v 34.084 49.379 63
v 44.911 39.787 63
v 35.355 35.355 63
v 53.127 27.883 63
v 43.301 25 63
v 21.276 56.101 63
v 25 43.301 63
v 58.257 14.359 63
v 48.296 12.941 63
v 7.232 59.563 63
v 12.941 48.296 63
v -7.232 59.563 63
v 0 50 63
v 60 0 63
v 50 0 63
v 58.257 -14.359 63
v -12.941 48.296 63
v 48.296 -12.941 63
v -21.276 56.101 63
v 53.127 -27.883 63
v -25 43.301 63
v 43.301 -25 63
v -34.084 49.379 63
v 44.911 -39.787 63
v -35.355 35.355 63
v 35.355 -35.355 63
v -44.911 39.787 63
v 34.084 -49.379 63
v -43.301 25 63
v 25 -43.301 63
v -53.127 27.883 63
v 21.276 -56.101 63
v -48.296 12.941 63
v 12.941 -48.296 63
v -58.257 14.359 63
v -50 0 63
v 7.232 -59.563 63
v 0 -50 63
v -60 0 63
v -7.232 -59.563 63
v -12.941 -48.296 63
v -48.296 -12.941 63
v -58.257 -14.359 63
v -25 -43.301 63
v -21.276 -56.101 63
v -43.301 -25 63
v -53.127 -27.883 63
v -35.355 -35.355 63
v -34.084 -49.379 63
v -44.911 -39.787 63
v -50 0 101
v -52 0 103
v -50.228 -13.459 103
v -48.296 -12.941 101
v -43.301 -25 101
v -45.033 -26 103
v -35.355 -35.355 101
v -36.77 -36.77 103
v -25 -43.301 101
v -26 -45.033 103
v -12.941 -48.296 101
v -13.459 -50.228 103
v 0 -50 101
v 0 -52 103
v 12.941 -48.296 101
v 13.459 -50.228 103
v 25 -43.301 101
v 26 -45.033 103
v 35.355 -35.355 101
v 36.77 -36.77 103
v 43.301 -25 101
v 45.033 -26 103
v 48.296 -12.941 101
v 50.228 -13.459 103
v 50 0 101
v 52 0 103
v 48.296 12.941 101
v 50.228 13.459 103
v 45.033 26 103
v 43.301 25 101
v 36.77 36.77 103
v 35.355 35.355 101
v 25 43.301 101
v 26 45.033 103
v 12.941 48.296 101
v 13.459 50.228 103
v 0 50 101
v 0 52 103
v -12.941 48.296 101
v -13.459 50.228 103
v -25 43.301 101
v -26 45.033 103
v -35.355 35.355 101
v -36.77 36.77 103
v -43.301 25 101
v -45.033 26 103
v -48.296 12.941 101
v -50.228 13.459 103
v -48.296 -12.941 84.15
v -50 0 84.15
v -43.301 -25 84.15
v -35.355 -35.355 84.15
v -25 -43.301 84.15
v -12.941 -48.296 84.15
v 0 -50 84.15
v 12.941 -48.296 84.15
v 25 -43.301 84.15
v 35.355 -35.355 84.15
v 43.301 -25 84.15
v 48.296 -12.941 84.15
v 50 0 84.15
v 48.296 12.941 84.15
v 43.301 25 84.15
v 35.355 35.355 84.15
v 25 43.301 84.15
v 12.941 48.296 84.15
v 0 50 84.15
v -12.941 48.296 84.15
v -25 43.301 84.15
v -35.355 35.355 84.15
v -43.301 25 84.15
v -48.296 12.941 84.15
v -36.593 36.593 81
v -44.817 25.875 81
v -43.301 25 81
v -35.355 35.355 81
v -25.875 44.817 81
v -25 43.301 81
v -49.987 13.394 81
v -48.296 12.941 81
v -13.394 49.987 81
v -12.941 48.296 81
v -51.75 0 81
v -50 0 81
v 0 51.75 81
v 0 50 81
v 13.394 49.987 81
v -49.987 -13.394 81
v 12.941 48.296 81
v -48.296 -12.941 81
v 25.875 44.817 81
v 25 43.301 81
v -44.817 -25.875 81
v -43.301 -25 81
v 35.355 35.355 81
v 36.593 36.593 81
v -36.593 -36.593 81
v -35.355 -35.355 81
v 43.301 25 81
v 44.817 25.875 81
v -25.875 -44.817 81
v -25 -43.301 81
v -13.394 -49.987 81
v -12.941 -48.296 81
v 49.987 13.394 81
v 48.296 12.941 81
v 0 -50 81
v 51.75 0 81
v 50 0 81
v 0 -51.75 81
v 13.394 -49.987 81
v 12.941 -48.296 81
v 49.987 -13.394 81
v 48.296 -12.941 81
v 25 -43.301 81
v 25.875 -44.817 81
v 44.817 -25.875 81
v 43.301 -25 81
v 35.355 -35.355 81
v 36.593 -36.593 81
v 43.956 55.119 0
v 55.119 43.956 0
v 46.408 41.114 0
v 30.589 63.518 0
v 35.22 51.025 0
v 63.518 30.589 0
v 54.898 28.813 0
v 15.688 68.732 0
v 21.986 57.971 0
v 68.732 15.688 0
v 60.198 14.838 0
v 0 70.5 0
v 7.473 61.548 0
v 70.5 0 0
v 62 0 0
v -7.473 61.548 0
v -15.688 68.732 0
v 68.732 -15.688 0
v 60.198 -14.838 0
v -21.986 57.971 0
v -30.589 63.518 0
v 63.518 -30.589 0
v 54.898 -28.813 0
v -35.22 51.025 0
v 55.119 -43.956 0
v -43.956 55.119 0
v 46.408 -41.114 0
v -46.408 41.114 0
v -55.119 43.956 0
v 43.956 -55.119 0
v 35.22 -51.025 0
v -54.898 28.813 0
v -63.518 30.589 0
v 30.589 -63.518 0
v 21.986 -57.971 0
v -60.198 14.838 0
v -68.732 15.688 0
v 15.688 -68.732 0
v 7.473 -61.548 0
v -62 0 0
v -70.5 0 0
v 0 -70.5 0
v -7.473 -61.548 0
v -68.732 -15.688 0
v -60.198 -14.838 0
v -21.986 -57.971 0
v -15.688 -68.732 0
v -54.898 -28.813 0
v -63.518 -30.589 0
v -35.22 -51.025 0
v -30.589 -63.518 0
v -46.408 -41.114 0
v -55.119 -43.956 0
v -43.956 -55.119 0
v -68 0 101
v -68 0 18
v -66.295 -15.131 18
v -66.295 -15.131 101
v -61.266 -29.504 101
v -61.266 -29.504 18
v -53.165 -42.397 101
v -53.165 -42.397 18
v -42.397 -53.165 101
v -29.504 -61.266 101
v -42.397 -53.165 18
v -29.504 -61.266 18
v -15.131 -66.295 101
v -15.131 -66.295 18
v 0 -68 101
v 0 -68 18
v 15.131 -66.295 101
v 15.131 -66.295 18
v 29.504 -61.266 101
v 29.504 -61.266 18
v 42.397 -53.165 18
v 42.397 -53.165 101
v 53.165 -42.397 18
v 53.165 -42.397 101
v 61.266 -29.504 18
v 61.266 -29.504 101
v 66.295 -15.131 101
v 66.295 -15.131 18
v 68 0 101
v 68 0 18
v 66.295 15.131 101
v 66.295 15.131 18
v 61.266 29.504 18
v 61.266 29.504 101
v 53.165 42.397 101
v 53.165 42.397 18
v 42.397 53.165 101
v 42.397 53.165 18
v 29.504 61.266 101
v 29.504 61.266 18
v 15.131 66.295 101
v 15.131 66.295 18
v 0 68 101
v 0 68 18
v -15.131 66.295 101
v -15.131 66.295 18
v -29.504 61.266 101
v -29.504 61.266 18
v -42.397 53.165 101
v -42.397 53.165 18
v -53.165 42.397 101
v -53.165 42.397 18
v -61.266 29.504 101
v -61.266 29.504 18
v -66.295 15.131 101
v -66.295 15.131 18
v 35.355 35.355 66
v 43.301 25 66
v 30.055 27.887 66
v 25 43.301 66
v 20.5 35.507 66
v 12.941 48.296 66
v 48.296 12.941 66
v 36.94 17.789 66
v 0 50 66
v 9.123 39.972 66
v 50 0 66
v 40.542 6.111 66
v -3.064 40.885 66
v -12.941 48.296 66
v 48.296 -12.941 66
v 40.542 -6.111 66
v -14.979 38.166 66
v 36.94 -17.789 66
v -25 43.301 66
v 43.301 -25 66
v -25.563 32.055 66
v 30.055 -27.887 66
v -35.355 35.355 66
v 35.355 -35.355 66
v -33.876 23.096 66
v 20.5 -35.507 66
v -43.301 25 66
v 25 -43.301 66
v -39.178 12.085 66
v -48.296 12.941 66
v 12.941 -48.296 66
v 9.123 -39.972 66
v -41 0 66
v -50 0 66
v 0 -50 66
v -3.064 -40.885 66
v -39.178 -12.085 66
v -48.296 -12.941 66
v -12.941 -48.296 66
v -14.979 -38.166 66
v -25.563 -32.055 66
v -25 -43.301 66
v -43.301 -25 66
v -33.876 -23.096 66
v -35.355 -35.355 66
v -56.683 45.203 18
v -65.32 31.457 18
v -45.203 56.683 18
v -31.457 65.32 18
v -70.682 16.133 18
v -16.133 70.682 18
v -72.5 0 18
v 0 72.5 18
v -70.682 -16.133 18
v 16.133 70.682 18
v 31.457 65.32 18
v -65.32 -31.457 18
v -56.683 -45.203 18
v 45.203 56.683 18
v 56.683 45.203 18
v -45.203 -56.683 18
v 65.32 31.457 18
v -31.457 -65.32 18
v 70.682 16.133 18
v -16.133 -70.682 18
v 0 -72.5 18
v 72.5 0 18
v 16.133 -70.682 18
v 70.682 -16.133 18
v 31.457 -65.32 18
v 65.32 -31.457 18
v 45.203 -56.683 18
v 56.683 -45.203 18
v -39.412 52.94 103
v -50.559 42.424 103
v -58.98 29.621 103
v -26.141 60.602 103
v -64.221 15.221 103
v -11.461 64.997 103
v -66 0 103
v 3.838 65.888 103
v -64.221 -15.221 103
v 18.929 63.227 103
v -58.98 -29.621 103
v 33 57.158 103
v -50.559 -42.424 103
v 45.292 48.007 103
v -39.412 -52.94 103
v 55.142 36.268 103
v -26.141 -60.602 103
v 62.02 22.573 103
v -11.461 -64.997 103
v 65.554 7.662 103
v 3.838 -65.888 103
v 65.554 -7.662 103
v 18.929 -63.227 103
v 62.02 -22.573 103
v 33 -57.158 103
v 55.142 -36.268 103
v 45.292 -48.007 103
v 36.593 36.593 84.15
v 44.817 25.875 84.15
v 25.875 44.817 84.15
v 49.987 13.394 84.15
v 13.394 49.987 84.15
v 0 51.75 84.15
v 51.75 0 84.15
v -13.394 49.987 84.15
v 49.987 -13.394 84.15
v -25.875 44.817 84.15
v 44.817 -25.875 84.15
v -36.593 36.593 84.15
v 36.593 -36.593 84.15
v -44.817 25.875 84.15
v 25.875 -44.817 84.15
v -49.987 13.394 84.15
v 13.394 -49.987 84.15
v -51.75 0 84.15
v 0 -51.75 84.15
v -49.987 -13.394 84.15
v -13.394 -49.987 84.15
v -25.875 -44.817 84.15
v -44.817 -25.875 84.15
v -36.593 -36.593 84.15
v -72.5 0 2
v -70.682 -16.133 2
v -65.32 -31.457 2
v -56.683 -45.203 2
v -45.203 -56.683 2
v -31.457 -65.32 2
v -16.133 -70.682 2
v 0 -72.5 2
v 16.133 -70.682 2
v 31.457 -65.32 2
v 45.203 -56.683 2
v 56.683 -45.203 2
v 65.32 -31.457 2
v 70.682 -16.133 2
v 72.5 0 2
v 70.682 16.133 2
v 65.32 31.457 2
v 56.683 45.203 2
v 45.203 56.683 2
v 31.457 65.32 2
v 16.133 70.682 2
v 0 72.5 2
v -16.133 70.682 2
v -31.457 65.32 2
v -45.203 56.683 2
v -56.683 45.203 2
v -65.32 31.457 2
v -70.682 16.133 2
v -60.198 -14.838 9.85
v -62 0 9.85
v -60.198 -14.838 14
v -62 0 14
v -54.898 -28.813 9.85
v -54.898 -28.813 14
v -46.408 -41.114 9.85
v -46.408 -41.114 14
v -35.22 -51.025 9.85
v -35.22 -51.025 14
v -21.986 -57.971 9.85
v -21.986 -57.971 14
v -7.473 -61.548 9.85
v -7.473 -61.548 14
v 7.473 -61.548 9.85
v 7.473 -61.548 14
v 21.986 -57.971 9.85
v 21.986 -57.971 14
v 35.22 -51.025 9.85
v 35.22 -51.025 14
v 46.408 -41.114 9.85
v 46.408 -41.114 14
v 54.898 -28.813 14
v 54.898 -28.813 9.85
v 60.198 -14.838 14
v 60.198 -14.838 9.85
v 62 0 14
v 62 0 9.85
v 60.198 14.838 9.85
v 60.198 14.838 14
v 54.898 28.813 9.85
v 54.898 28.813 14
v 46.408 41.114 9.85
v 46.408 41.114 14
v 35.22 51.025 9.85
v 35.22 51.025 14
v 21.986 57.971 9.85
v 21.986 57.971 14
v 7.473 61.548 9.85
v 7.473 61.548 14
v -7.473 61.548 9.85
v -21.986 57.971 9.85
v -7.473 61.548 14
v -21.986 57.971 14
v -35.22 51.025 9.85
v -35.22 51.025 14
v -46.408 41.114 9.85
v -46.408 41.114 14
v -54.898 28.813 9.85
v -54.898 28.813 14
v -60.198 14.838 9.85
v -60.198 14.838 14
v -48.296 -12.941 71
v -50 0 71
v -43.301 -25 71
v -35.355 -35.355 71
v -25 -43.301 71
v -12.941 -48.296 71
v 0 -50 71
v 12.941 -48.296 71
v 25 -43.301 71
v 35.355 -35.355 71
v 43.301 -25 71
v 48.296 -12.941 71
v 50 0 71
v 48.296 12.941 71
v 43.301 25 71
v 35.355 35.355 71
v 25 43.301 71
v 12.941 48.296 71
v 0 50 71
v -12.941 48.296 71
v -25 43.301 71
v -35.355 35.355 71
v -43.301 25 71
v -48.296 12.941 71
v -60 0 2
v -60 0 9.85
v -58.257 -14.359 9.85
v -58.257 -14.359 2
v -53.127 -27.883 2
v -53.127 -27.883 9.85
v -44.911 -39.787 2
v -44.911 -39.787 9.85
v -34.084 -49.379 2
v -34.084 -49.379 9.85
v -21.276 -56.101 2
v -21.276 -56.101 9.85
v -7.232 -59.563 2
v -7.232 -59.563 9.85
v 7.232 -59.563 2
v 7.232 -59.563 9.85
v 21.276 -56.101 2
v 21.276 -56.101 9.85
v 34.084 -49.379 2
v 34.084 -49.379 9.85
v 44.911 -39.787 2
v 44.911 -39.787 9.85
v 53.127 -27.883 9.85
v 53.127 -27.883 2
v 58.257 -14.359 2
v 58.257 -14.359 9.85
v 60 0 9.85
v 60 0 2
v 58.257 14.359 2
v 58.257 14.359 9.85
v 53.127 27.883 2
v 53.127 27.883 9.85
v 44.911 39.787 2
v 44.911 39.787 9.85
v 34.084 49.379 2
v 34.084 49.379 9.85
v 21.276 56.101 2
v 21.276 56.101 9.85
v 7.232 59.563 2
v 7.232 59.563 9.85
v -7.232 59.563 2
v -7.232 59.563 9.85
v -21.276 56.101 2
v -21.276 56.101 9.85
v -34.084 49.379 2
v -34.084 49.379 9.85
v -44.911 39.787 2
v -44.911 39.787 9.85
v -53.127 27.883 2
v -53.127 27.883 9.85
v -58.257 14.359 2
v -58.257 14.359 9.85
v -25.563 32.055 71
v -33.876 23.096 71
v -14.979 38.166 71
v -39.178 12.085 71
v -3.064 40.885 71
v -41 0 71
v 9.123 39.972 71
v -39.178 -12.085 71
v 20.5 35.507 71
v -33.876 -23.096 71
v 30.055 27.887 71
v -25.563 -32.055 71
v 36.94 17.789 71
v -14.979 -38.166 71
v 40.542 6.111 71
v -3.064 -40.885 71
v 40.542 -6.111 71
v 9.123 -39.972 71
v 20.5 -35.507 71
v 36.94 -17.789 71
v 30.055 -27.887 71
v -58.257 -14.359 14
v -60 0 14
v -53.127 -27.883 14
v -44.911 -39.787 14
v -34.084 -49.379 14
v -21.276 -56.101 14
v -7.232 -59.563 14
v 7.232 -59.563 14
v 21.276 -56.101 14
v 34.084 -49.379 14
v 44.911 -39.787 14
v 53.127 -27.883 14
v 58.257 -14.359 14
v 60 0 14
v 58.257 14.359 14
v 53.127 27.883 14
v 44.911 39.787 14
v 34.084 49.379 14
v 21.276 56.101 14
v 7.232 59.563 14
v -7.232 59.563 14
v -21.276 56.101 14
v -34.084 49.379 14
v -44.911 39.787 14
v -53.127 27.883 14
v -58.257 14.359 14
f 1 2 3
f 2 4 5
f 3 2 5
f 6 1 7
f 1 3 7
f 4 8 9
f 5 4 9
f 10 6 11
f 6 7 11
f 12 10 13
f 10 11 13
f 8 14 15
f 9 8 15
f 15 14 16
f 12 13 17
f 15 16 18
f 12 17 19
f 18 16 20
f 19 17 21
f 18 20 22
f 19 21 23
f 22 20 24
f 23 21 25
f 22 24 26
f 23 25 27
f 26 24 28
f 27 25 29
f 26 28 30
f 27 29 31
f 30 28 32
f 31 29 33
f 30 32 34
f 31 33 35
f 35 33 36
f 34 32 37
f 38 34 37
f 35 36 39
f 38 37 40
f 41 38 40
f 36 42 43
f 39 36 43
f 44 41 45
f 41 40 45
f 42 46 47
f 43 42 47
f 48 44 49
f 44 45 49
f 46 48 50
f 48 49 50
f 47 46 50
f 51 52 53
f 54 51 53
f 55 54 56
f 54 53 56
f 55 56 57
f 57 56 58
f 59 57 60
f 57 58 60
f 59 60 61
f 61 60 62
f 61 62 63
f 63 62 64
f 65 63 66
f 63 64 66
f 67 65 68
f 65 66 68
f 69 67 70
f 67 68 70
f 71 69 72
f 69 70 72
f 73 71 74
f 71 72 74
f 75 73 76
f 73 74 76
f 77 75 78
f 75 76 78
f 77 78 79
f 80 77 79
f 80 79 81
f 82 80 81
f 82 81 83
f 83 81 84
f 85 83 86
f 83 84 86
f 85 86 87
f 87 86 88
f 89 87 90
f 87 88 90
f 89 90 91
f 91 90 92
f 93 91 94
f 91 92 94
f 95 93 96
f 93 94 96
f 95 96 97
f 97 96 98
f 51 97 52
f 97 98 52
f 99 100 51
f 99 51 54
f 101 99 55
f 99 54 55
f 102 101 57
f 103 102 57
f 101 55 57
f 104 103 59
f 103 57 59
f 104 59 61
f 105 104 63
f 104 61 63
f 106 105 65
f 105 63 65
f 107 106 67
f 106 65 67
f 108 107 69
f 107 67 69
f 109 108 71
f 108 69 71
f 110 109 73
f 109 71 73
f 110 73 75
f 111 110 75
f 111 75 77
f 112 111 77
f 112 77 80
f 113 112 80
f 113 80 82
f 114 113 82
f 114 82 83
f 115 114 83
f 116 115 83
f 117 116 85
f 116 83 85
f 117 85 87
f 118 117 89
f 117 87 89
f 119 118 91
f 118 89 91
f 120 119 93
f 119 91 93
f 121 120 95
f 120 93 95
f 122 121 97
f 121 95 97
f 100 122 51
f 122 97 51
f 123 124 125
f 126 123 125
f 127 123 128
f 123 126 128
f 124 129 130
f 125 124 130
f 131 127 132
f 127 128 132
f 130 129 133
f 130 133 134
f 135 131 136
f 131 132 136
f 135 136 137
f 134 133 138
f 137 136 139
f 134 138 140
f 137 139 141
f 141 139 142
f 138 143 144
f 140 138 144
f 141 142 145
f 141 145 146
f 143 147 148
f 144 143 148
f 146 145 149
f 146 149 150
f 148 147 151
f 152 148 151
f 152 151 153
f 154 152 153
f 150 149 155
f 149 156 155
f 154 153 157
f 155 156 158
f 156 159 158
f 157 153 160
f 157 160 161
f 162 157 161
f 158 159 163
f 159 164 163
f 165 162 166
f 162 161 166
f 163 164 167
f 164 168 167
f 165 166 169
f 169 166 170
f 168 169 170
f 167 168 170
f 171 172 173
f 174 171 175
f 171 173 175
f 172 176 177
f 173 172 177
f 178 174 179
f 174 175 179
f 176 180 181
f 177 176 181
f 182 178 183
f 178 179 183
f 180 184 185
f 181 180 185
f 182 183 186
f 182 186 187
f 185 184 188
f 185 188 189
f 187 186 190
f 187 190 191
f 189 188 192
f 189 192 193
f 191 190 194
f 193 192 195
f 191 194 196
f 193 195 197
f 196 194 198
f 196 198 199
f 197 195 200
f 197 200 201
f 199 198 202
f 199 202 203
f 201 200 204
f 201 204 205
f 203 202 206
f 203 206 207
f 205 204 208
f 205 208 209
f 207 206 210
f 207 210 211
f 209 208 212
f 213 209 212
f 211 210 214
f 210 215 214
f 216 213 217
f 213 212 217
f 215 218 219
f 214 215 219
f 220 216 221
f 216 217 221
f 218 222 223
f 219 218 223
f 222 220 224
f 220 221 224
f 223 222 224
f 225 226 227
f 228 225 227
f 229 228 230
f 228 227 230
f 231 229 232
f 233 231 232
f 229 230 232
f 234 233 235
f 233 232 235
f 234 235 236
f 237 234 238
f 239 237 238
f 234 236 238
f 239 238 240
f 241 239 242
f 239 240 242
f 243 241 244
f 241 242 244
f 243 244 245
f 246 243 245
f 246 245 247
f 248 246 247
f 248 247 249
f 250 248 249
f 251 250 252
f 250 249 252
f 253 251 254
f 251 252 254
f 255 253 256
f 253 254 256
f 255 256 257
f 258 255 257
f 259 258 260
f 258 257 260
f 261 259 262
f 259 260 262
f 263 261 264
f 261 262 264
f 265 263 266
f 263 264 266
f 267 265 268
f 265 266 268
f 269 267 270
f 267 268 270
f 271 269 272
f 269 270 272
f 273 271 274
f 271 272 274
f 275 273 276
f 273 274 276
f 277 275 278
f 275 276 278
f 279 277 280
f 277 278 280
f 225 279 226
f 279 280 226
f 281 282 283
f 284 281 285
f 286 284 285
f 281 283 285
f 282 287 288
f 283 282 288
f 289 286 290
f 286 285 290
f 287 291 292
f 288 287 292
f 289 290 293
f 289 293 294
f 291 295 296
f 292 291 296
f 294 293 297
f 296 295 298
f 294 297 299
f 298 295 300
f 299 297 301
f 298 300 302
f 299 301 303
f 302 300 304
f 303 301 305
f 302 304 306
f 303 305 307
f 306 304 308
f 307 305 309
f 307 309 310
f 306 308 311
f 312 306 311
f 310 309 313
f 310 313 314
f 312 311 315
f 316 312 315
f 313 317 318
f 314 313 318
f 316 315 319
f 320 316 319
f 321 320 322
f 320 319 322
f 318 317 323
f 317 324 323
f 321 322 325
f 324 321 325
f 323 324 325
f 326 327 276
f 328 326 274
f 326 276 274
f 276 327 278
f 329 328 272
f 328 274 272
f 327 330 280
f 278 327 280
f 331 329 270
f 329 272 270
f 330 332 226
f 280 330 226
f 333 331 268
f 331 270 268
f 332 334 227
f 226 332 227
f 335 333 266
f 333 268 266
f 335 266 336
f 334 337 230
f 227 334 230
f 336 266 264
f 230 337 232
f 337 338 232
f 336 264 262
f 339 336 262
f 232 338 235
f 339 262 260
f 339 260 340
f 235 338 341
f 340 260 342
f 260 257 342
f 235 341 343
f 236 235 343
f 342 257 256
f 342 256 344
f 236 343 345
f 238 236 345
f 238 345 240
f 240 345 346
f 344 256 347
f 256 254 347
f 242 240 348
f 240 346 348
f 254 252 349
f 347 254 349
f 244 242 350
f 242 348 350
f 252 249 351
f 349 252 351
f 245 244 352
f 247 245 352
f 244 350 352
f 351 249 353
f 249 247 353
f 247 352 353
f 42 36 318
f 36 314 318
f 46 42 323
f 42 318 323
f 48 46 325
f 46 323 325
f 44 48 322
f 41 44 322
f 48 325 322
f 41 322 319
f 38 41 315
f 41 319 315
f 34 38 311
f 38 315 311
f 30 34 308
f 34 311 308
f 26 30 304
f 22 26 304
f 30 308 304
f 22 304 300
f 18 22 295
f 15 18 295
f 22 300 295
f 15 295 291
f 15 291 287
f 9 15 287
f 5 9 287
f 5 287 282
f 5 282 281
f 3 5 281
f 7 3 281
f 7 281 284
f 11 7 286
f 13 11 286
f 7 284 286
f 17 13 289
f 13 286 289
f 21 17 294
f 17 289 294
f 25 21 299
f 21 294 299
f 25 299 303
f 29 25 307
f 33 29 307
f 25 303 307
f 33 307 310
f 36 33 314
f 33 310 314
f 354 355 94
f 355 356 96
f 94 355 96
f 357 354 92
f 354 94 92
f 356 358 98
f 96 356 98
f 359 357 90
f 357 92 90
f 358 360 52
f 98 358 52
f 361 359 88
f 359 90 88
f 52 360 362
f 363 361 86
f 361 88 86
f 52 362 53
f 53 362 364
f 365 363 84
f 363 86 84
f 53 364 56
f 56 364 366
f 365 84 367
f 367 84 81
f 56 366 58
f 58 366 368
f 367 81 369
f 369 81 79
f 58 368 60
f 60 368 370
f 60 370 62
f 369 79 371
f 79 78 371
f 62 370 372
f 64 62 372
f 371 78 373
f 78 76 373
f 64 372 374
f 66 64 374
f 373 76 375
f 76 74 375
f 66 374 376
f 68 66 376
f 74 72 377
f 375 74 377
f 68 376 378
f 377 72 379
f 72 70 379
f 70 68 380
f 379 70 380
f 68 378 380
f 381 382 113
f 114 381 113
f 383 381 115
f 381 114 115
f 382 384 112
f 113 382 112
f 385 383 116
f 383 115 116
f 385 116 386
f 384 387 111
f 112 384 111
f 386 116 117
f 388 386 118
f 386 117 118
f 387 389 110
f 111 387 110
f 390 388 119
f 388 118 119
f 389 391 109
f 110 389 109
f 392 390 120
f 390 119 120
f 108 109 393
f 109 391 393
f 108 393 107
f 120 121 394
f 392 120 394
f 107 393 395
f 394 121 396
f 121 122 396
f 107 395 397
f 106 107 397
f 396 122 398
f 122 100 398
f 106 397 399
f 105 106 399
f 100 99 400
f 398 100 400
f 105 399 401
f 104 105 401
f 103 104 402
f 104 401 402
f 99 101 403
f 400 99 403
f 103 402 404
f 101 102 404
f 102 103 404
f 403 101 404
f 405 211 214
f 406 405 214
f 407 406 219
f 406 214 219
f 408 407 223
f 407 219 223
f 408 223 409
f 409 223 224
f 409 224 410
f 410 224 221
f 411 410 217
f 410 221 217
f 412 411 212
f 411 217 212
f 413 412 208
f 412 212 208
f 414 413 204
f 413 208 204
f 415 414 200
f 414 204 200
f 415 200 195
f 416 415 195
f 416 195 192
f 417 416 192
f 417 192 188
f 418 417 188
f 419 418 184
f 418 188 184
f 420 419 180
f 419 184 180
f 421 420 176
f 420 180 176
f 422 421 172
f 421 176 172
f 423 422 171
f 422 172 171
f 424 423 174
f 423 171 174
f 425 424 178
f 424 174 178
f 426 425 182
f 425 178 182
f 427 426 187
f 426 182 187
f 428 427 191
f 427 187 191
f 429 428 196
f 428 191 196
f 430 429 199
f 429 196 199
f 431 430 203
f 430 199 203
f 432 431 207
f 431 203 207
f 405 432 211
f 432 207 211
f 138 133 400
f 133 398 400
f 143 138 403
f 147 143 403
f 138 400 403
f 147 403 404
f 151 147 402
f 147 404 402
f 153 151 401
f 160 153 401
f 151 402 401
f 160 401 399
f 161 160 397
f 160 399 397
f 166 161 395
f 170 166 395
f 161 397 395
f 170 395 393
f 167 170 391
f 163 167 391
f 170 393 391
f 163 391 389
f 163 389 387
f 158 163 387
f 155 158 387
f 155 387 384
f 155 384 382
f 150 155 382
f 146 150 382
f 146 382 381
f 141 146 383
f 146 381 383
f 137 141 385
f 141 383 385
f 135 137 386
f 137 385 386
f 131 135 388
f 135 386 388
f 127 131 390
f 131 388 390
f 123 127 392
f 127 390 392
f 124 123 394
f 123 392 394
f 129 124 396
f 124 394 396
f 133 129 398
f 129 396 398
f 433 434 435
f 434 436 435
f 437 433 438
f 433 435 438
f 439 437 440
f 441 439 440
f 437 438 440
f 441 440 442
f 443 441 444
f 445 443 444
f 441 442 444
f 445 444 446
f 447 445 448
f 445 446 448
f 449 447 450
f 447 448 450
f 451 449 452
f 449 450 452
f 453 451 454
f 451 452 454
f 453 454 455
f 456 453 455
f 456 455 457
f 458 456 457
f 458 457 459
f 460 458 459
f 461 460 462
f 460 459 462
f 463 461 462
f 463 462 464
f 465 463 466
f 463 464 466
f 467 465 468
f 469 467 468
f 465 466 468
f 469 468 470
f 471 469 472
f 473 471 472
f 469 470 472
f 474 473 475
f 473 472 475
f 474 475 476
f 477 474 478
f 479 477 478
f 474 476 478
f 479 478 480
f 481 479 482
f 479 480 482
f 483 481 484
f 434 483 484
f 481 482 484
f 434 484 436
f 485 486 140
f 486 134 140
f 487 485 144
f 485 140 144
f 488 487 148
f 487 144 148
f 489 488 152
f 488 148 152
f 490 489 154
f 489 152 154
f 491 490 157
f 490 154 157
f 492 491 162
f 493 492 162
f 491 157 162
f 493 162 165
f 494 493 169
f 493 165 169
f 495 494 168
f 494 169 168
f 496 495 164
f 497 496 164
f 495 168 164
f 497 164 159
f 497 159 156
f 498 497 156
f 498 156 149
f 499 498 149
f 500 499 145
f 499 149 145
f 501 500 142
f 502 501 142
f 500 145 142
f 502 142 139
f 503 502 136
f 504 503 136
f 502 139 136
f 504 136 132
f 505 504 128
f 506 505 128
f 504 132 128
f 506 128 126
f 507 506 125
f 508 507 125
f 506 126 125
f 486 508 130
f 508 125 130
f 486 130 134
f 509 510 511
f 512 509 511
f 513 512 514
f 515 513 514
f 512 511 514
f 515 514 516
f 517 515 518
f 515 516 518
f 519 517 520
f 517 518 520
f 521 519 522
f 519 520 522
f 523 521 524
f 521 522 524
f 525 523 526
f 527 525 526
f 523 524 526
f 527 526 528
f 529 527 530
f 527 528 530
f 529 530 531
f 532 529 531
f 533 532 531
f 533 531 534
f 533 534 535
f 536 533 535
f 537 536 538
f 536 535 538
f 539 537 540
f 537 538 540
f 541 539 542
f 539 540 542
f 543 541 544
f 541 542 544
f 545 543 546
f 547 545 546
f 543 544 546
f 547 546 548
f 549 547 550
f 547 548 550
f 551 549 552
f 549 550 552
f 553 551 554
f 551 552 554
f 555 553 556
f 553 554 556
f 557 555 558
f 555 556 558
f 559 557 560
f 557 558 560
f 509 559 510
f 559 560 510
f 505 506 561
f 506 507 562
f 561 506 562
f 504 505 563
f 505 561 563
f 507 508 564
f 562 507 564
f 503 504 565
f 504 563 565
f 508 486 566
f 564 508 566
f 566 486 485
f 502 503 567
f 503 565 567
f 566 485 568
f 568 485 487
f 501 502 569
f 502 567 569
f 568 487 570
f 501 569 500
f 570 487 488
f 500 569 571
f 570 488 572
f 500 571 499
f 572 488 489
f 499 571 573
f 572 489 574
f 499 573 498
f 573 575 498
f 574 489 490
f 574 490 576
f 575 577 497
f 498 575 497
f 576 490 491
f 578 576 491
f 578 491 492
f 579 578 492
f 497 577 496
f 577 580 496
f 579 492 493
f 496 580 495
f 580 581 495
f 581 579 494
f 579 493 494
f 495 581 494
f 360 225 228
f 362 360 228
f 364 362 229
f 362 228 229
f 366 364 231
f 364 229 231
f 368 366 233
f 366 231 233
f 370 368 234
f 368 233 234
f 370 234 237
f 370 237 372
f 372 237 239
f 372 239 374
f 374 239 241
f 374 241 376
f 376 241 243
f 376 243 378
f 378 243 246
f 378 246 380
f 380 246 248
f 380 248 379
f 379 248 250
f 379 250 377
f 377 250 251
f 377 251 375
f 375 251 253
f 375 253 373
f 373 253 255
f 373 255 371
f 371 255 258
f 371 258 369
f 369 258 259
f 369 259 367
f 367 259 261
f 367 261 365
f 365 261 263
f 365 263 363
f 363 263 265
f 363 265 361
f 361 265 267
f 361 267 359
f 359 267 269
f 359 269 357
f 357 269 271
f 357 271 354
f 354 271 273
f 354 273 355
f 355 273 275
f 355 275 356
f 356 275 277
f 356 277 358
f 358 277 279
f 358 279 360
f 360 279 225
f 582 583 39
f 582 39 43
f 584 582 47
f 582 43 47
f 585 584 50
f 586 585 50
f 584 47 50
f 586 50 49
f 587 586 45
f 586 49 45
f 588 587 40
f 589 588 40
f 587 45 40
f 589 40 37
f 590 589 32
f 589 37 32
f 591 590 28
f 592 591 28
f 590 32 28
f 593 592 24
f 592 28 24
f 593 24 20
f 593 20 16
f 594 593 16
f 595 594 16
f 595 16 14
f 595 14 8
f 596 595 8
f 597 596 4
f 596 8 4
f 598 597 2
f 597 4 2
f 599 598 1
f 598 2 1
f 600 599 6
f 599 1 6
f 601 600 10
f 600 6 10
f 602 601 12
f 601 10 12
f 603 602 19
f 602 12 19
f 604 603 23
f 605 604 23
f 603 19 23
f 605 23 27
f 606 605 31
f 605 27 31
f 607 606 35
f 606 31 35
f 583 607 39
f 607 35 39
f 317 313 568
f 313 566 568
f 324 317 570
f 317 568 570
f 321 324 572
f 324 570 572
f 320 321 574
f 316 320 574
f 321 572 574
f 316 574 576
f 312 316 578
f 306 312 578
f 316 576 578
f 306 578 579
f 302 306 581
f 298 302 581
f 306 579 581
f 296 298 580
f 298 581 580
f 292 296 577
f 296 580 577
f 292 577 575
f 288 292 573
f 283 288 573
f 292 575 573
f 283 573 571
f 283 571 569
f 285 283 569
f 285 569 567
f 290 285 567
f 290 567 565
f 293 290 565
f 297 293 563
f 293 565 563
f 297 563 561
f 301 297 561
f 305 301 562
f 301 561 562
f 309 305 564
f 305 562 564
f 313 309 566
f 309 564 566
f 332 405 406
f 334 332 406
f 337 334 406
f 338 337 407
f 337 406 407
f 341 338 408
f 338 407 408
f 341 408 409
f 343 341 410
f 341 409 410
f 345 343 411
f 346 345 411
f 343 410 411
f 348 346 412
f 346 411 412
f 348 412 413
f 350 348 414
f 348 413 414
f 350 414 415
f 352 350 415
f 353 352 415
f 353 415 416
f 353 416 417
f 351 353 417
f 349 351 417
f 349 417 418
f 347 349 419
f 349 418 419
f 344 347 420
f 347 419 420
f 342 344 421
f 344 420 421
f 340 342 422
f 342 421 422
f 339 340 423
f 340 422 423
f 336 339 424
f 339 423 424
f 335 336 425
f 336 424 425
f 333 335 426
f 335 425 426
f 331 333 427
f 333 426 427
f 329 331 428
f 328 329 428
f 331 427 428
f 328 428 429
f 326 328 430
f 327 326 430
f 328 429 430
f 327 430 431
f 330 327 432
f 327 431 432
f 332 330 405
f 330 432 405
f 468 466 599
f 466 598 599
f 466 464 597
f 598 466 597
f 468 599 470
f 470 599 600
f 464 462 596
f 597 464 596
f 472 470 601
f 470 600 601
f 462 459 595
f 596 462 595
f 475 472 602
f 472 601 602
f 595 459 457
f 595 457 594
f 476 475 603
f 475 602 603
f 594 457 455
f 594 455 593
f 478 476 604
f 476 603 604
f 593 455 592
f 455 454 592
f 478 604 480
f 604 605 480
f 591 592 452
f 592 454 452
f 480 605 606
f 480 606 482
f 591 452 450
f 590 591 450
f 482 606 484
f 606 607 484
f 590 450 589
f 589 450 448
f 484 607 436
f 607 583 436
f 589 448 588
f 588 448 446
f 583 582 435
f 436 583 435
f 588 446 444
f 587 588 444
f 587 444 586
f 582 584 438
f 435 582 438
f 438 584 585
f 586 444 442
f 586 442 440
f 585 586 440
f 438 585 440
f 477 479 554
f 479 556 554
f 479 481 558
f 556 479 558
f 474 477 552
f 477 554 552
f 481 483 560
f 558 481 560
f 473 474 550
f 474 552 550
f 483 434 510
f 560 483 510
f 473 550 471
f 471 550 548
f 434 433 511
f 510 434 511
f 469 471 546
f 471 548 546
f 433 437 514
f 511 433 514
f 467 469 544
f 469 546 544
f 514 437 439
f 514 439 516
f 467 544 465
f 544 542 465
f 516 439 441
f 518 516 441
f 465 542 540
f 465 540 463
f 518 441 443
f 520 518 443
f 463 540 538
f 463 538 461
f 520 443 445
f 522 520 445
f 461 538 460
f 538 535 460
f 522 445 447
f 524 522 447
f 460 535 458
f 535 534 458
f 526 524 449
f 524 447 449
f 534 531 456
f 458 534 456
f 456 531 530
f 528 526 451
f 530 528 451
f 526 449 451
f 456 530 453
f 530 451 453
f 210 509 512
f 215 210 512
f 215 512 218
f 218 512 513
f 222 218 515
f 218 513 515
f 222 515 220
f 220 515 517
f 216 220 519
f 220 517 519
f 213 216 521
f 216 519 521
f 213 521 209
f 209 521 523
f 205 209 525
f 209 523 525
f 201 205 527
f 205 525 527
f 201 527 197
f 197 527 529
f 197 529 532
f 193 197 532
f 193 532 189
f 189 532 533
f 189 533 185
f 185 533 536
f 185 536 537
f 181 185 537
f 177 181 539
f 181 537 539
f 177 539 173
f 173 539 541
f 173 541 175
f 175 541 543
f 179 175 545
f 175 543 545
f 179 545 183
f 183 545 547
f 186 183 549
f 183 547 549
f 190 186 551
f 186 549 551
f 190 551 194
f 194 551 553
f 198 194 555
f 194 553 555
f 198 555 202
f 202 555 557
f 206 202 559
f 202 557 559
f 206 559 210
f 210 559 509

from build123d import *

# Parameters (mm, degrees)
CHAMFER_2_SIZE = 2


with BuildPart() as part:
    # Эскиз1 → Повернуть1 (revolve)
    with BuildSketch(Plane(origin=(0, 0, 0), x_dir=(0, 0, -1), z_dir=(1, 0, 0)), mode=Mode.PRIVATE) as revolve_1_sk:
        Polygon((-84.15, 50), (-103, 50), (-103, 68), (-18, 68), (-18, 72.5), (0, 72.5), (0, 60), (-9.85, 60), (-9.85, 62), (-14, 62), (-14, 60), (-63, 60), (-63, 50), (-66, 50), (-66, 41), (-71, 41), (-71, 50), (-81, 50), (-81, 51.75), (-84.15, 51.75), align=None)
    revolve(revolve_1_sk.sketch.rotate(Axis((0, 0, 0), (0, 0, 1)), 90), axis=Axis((0, 0, 0), (0, 0, 1)))

    # Фаска2
    chamfer_2_edges = [part.edges().sort_by_distance(p)[0] for p in [
        (50, 0, 103),
        (60, 0, 0),
        (72.5, 0, 0),
        (68, 0, 103),
    ]]
    chamfer(chamfer_2_edges, length=CHAMFER_2_SIZE)


solid = part.part
